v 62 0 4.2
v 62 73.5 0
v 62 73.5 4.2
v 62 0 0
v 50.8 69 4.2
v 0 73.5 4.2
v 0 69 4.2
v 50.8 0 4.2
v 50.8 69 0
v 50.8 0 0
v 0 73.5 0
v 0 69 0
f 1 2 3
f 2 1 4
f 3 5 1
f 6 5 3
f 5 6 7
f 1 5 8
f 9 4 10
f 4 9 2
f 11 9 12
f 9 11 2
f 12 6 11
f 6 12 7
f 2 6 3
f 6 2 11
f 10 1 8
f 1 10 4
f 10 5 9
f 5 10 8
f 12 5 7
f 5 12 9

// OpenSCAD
//height of the intended battery
iHeight = 73.5;
//width of the intended battery
iWidth = 62;
// depth of the intended battery
depth = 4.2;
//height of the unintended battery
uHeight = 69;
//width of the unintended battery
uWidth = 50.8;

difference(){
    
    cube([iWidth,iHeight,depth], 2);
    cube([uWidth,uHeight,depth], 0);
    
}
